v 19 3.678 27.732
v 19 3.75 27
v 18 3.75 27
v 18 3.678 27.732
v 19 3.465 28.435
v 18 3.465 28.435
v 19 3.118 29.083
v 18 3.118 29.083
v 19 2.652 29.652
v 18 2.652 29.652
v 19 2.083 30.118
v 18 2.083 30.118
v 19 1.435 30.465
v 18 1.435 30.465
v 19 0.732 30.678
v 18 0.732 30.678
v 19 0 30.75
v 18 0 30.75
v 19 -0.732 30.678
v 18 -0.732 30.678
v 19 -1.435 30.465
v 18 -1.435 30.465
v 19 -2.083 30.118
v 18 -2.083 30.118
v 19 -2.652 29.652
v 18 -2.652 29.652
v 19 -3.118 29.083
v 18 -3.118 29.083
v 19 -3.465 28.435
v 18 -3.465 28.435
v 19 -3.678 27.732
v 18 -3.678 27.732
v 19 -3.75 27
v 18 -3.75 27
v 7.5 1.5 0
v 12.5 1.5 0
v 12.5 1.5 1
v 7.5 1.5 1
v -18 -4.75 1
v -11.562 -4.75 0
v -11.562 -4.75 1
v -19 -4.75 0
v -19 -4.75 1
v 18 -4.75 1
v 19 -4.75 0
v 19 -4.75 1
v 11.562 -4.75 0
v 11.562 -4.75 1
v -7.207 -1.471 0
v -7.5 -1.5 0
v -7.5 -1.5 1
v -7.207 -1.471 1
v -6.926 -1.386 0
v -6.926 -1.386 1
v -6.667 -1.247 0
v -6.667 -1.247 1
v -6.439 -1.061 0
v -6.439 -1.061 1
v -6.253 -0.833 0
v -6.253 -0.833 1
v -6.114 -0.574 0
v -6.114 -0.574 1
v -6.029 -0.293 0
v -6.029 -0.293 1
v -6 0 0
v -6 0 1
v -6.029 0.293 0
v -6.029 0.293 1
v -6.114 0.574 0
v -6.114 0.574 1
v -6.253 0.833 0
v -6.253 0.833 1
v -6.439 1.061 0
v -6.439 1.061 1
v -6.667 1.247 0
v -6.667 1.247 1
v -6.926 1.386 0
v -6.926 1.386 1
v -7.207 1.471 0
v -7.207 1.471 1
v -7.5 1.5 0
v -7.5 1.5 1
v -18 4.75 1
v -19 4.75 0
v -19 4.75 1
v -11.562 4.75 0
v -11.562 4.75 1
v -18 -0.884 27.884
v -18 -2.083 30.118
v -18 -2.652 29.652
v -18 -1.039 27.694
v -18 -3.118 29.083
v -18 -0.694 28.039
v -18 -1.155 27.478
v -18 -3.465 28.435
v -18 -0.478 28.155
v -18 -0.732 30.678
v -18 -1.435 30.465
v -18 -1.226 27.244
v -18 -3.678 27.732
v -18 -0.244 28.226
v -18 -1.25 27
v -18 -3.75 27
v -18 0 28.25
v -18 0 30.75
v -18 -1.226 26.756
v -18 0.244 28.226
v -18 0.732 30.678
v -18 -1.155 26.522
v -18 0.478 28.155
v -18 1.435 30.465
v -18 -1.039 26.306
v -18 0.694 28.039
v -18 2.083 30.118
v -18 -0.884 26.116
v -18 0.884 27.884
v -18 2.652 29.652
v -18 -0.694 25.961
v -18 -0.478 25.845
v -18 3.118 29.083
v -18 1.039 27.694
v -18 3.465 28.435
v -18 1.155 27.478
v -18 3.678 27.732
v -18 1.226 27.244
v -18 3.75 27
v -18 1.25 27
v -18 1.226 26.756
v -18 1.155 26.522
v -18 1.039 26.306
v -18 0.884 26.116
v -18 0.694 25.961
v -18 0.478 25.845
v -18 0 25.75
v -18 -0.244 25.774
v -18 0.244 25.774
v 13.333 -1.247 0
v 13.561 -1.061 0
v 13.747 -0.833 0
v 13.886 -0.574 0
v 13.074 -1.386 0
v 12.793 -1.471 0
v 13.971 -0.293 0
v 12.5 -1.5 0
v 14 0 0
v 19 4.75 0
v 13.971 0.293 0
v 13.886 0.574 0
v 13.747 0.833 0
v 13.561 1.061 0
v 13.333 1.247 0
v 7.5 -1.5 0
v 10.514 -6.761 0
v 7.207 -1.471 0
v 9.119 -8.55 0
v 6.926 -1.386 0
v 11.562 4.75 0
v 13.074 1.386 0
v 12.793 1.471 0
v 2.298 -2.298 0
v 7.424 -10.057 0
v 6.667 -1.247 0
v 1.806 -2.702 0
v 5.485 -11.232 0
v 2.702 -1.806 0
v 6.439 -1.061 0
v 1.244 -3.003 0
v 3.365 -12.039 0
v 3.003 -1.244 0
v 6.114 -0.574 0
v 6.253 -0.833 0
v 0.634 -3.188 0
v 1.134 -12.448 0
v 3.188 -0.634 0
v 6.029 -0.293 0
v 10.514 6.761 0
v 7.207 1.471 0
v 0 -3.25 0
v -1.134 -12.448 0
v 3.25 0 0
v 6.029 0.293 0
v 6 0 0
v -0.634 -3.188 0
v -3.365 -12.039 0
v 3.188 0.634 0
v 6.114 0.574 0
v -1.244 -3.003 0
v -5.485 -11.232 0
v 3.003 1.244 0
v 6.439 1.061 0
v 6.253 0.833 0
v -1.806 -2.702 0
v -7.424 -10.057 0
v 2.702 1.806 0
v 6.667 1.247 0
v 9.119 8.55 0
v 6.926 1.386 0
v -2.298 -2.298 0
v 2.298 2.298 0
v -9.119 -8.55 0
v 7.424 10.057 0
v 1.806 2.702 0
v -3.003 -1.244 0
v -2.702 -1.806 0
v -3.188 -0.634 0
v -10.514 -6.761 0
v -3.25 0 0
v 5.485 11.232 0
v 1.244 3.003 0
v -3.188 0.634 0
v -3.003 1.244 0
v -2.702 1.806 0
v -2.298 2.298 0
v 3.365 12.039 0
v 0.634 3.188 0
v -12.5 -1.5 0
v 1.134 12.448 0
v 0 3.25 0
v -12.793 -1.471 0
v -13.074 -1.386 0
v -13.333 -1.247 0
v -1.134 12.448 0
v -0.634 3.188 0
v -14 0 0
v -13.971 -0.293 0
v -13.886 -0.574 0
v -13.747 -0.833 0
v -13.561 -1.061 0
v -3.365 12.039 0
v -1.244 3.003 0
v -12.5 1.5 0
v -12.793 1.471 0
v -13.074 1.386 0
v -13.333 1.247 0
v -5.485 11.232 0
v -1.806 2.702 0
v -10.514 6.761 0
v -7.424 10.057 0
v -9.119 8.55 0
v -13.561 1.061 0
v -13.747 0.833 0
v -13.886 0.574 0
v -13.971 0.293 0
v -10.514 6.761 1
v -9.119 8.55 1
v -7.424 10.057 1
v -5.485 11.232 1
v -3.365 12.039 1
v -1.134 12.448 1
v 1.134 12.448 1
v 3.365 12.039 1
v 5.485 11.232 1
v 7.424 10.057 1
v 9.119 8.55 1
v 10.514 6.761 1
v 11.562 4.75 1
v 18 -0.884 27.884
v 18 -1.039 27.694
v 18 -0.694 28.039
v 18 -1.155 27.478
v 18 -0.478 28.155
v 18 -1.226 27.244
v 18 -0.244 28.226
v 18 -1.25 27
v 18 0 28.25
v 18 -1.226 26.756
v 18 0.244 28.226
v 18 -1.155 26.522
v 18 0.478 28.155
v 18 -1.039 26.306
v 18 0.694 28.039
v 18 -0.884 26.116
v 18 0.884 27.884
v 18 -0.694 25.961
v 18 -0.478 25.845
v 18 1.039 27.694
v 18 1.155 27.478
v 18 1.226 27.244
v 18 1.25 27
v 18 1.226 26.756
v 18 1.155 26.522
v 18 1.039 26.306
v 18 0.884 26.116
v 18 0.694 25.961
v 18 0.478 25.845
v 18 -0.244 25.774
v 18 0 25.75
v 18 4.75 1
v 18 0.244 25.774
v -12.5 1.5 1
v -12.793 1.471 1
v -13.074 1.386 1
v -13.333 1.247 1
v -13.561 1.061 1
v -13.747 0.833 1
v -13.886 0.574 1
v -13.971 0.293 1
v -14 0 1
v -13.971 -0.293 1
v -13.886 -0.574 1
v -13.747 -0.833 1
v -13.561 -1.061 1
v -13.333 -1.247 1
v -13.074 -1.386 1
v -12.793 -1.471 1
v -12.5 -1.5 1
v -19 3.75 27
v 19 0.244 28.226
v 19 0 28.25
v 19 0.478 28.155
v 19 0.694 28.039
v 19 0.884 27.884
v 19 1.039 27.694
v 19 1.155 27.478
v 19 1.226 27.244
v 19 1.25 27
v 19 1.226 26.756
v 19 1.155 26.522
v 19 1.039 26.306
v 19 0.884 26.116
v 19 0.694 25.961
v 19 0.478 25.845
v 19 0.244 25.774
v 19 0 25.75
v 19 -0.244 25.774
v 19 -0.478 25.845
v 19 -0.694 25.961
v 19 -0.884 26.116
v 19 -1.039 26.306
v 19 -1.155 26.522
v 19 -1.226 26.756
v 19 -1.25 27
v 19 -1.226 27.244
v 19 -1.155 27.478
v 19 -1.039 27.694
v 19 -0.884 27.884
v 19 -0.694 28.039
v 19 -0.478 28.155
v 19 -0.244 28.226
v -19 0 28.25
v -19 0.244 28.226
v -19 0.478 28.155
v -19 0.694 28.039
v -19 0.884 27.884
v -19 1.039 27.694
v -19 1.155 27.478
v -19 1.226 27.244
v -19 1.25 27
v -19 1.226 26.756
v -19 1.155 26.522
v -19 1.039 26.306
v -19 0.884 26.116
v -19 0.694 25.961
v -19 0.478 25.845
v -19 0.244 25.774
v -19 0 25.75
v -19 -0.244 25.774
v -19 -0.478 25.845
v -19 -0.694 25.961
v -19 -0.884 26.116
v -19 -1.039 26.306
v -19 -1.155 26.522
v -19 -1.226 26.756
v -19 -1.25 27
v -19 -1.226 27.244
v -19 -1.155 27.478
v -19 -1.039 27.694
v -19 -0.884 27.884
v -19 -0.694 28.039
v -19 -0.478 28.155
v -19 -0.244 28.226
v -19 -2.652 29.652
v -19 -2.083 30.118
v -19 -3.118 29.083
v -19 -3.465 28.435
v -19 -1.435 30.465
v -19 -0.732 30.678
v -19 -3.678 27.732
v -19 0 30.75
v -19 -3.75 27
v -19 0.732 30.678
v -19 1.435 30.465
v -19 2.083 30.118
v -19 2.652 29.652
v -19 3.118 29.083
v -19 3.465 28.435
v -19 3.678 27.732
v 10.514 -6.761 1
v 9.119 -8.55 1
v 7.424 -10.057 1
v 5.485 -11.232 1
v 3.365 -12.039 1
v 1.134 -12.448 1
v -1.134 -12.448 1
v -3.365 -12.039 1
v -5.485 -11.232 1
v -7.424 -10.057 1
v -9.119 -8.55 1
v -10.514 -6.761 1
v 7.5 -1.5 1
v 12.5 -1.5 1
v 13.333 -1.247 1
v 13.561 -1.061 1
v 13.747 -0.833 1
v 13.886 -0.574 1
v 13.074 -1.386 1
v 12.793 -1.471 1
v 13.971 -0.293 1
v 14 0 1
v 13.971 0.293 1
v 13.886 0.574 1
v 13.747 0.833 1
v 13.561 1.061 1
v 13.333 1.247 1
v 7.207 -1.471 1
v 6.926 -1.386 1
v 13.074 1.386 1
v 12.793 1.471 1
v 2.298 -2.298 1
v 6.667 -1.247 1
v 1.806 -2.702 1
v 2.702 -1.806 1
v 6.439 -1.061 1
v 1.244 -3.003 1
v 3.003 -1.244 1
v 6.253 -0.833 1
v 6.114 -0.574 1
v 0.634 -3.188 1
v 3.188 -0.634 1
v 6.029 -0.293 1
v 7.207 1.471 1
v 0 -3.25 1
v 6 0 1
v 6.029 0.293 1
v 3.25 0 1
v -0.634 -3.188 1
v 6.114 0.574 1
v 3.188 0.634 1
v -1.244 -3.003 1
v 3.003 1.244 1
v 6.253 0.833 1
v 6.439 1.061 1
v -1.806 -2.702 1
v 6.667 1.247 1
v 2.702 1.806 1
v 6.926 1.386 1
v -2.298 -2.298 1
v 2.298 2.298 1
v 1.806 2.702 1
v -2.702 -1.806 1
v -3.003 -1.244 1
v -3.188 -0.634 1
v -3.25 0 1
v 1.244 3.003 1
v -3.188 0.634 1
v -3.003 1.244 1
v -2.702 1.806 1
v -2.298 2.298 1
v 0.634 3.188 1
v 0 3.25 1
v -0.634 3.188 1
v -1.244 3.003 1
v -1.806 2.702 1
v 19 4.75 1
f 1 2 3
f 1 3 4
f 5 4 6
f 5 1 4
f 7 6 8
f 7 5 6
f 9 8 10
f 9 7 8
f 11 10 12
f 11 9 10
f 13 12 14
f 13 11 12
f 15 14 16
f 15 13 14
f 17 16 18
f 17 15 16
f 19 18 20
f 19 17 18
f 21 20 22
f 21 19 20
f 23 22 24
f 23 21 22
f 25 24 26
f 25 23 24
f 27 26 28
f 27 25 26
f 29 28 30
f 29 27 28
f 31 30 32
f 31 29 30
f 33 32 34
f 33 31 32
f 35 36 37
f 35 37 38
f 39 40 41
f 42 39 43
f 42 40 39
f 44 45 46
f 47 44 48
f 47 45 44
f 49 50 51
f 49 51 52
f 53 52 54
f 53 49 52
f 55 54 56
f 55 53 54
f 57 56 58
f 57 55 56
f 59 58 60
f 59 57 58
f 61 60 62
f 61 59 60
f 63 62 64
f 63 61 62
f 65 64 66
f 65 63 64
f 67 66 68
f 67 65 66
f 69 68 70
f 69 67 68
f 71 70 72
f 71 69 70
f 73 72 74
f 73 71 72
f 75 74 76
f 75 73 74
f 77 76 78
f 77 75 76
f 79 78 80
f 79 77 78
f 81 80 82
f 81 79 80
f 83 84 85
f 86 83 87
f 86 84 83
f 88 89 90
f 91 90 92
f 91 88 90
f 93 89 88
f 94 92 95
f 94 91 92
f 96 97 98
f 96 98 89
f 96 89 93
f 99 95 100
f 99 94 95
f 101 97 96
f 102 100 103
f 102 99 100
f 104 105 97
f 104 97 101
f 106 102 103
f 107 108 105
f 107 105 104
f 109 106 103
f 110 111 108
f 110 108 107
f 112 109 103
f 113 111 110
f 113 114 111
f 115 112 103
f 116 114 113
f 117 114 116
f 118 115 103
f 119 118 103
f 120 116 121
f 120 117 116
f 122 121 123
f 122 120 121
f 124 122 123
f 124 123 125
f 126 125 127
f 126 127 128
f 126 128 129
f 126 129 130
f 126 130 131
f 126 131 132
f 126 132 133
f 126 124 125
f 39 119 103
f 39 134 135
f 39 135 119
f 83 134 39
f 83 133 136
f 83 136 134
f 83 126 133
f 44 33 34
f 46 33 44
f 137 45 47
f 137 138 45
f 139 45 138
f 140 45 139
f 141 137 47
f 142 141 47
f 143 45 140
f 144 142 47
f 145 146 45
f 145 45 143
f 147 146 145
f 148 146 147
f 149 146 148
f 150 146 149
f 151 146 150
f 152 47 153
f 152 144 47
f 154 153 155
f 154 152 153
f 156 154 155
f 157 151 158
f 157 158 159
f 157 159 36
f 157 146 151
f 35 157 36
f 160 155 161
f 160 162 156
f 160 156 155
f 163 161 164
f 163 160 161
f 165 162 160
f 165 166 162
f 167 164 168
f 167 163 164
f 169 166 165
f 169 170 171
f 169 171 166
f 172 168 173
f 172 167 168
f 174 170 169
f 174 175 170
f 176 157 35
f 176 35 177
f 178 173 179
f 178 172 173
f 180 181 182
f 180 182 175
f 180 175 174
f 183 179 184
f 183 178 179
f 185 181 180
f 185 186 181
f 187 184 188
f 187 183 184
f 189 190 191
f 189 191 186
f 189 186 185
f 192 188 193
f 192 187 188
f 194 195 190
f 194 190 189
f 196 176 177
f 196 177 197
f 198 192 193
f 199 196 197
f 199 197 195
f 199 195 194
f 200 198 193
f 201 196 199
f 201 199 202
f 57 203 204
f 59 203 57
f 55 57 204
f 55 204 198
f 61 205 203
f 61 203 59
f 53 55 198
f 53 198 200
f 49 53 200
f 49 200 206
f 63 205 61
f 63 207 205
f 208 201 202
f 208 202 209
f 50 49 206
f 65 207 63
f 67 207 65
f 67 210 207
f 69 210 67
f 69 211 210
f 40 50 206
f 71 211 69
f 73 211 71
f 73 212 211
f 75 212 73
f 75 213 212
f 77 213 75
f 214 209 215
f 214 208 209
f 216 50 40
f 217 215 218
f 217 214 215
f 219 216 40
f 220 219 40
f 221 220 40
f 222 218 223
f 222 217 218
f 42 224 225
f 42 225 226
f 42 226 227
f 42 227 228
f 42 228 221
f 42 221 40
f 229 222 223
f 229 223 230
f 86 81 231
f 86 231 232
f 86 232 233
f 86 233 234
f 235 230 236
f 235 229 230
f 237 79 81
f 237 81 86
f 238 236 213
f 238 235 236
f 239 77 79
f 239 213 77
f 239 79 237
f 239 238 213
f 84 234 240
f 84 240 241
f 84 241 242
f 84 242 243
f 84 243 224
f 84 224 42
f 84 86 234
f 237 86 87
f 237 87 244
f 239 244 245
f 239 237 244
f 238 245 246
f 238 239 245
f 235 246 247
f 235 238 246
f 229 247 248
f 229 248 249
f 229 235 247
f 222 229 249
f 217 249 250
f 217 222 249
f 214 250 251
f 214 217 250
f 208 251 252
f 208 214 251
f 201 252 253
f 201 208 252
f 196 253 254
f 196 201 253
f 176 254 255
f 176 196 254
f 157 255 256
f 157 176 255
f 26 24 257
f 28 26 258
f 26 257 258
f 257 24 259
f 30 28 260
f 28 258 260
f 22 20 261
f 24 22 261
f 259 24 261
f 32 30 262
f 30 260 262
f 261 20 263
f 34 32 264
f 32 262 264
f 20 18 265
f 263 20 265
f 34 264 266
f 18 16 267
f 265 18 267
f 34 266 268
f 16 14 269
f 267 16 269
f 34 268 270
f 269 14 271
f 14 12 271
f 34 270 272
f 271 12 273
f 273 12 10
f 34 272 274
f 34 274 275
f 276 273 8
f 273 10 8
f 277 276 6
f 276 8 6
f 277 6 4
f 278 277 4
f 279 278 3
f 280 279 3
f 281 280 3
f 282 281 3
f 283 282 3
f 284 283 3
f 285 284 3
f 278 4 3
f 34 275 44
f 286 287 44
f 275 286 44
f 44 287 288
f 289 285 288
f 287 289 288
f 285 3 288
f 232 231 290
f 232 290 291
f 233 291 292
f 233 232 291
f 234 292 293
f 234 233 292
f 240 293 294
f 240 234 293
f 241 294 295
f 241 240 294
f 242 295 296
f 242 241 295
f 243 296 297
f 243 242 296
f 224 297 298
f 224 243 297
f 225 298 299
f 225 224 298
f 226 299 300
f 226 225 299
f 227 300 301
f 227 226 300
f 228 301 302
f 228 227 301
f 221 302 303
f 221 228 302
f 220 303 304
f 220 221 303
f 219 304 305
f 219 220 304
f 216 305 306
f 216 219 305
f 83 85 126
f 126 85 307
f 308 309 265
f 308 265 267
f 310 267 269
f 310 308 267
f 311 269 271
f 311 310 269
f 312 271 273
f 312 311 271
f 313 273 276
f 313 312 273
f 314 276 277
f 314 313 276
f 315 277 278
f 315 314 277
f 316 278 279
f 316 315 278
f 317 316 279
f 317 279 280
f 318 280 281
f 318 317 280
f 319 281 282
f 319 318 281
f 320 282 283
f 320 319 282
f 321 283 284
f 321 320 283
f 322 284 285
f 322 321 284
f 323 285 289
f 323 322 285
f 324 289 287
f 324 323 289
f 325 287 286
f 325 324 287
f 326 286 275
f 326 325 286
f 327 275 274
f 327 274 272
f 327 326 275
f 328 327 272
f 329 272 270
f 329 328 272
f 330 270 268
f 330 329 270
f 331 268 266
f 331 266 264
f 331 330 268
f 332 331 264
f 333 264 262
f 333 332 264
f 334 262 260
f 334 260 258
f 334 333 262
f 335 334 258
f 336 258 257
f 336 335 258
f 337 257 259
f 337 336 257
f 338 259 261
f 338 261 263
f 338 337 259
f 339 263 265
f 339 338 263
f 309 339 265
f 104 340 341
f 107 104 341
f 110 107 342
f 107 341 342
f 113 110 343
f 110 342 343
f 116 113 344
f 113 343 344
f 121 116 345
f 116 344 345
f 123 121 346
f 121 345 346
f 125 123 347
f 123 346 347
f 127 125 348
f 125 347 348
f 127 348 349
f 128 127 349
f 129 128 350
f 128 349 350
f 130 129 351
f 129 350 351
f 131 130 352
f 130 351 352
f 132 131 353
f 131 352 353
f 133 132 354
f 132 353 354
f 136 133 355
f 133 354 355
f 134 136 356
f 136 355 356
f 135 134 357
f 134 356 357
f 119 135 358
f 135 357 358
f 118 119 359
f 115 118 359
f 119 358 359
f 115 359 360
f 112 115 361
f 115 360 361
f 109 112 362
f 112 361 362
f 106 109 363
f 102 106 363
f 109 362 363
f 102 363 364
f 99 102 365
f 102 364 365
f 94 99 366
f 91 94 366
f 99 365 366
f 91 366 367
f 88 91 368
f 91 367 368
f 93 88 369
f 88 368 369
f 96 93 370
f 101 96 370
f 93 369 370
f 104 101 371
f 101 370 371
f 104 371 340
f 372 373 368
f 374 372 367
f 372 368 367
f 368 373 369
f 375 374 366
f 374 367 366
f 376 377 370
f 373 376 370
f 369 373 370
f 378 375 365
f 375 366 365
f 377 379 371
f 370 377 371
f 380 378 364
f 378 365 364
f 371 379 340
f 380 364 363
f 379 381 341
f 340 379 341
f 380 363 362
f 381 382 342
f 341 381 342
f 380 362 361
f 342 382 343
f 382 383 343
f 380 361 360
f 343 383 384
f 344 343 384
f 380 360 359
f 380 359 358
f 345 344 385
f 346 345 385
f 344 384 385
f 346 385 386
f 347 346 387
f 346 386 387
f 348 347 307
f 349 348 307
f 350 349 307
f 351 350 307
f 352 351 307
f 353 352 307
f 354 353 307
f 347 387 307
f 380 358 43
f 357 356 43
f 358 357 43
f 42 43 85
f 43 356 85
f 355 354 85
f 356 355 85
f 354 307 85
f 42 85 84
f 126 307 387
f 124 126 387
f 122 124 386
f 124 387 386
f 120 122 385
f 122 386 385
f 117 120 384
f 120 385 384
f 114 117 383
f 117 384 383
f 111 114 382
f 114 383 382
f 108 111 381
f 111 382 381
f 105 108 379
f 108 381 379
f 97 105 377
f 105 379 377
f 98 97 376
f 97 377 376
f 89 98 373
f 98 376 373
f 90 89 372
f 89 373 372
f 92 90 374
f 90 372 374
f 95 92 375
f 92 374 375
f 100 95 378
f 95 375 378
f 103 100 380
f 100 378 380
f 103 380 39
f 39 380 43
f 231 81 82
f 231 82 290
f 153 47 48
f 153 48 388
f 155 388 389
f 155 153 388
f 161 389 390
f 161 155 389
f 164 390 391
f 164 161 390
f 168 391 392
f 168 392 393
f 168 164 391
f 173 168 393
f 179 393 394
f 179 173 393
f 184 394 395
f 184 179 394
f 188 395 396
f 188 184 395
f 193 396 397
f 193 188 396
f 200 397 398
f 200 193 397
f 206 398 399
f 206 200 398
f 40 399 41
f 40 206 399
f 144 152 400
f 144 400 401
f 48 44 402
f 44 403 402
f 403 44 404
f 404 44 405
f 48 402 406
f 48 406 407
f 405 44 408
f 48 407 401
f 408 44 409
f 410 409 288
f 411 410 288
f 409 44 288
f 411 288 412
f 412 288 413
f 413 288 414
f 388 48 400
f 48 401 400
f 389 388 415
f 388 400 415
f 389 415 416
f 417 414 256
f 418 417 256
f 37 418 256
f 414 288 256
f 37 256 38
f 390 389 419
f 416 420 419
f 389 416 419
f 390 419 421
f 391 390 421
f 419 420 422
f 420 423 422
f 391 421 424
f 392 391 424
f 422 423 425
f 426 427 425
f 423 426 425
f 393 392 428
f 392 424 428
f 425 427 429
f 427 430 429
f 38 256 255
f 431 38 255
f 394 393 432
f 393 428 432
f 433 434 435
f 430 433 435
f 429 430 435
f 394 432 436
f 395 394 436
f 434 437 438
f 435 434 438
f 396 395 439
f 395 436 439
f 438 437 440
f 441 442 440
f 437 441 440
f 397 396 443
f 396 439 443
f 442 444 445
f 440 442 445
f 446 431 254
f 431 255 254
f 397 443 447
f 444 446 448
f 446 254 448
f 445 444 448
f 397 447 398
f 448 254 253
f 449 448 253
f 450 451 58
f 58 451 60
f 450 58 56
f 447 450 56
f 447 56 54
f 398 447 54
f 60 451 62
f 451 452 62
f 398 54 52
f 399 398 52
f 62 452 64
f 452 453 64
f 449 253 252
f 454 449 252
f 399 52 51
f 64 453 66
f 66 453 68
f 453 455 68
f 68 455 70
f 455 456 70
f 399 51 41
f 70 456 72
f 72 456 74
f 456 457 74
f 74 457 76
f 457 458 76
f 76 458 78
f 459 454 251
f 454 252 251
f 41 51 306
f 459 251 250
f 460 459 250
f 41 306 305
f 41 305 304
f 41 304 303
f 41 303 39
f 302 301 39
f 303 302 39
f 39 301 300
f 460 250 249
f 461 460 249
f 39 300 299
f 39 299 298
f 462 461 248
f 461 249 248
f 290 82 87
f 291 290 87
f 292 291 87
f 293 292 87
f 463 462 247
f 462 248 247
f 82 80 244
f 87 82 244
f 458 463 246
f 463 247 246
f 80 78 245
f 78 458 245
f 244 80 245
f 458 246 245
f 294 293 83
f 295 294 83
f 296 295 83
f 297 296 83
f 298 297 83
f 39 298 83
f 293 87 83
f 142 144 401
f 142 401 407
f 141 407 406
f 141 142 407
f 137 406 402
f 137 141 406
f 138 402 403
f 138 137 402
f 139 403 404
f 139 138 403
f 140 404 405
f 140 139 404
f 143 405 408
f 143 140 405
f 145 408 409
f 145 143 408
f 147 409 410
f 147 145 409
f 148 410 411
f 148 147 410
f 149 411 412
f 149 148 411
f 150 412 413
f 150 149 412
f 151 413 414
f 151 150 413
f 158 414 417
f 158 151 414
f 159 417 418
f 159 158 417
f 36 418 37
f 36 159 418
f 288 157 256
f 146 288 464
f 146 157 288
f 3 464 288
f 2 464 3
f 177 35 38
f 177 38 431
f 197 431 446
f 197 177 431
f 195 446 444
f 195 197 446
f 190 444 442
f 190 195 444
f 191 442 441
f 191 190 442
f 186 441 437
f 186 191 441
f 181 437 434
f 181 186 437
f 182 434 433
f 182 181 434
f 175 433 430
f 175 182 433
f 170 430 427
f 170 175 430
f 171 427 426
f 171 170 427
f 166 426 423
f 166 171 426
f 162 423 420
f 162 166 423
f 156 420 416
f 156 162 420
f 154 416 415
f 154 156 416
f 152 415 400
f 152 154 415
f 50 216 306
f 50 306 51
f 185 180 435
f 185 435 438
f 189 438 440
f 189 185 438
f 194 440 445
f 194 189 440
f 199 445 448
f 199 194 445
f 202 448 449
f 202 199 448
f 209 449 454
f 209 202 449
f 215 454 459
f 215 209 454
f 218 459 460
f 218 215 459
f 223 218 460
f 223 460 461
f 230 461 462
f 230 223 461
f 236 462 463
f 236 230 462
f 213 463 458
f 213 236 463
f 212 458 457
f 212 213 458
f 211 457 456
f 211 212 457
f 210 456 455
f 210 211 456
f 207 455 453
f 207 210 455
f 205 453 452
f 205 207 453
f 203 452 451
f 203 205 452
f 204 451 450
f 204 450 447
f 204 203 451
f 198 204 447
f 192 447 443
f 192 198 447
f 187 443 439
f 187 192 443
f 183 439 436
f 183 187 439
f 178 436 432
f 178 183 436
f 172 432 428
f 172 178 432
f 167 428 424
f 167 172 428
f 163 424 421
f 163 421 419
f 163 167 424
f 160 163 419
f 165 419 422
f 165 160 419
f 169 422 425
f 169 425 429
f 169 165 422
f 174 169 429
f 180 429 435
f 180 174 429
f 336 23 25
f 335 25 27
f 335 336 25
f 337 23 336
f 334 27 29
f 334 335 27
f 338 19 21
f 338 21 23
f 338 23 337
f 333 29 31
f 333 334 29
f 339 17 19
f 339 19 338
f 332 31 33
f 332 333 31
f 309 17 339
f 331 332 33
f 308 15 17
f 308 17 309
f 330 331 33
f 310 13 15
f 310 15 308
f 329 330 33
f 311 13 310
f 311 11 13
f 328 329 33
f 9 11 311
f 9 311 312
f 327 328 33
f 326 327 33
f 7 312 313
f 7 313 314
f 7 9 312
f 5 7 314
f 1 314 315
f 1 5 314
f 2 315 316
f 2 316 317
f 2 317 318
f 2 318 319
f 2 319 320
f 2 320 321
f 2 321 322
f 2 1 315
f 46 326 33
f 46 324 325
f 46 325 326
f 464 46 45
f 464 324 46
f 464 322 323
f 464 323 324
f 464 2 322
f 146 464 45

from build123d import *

# Parameters (mm, degrees)
SKETCH_1_R                = 3.25
EXTRUDE_1_DEPTH           = 1
HOLE_WIZARD_3_0_3_1_DEPTH = 1
SKETCH_7_R                = 1.25
EXTRUDE_2_DEPTH           = 1


# Read off the part's stored shape, not the designer's step: Ø3.0 (3) 直径槽口1
with BuildPart() as part:
    # 草图1 → 凸台-拉伸1 (new body)
    with BuildSketch(Plane.XY):
        with BuildLine():
            Line((11.56233108, 4.75), (19, 4.75))
            Line((19, 4.75), (19, -4.75))
            Line((19, -4.75), (11.56233108, -4.75))
            ThreePointArc((11.56233108, -4.75), (0, -12.5), (-11.56233108, -4.75))
            Line((-11.56233108, -4.75), (-19, -4.75))
            Line((-19, -4.75), (-19, 4.75))
            Line((-19, 4.75), (-11.56233108, 4.75))
            ThreePointArc((-11.56233108, 4.75), (0, 12.5), (11.56233108, 4.75))
        make_face()
        Circle(SKETCH_1_R, mode=Mode.SUBTRACT)
    extrude(amount=EXTRUDE_1_DEPTH)

    # Ø3.0 (3) 直径槽口1 outline → Ø3.0 (3) 直径槽口1 (cut)
    with BuildSketch(Plane.XY):
        with BuildLine():
            Line((7.5, -1.5), (12.5, -1.5))
            ThreePointArc((12.5, -1.5), (14, 0), (12.5, 1.5))
            Line((12.5, 1.5), (7.5, 1.5))
            ThreePointArc((7.5, 1.5), (6, 0), (7.5, -1.5))
        make_face()
        with BuildLine():
            ThreePointArc((-7.5, -1.5), (-6, 0), (-7.5, 1.5))
            Line((-7.5, 1.5), (-12.5, 1.5))
            ThreePointArc((-12.5, 1.5), (-14, 0), (-12.5, -1.5))
            Line((-12.5, -1.5), (-7.5, -1.5))
        make_face()
    extrude(amount=HOLE_WIZARD_3_0_3_1_DEPTH, mode=Mode.SUBTRACT)

    # 草图7 → 凸台-拉伸2 (add)
    with BuildSketch(Plane.ZY.offset(19)):
        with BuildLine():
            Line((1, 4.75), (27, 3.75))
            ThreePointArc((27, 3.75), (30.75, 0), (27, -3.75))
            Line((27, -3.75), (1, -4.75))
            Line((1, -4.75), (1, 4.75))
        make_face()
        with Locations((27, 0)):
            Circle(SKETCH_7_R, mode=Mode.SUBTRACT)
    extrude_2 = extrude(amount=-EXTRUDE_2_DEPTH)

    # 镜向1: 凸台-拉伸2 across plane
    add(extrude_2.mirror(Plane(origin=(0, 0, 0), x_dir=(0, 0, 1), z_dir=(1, 0, 0))))


solid = part.part
